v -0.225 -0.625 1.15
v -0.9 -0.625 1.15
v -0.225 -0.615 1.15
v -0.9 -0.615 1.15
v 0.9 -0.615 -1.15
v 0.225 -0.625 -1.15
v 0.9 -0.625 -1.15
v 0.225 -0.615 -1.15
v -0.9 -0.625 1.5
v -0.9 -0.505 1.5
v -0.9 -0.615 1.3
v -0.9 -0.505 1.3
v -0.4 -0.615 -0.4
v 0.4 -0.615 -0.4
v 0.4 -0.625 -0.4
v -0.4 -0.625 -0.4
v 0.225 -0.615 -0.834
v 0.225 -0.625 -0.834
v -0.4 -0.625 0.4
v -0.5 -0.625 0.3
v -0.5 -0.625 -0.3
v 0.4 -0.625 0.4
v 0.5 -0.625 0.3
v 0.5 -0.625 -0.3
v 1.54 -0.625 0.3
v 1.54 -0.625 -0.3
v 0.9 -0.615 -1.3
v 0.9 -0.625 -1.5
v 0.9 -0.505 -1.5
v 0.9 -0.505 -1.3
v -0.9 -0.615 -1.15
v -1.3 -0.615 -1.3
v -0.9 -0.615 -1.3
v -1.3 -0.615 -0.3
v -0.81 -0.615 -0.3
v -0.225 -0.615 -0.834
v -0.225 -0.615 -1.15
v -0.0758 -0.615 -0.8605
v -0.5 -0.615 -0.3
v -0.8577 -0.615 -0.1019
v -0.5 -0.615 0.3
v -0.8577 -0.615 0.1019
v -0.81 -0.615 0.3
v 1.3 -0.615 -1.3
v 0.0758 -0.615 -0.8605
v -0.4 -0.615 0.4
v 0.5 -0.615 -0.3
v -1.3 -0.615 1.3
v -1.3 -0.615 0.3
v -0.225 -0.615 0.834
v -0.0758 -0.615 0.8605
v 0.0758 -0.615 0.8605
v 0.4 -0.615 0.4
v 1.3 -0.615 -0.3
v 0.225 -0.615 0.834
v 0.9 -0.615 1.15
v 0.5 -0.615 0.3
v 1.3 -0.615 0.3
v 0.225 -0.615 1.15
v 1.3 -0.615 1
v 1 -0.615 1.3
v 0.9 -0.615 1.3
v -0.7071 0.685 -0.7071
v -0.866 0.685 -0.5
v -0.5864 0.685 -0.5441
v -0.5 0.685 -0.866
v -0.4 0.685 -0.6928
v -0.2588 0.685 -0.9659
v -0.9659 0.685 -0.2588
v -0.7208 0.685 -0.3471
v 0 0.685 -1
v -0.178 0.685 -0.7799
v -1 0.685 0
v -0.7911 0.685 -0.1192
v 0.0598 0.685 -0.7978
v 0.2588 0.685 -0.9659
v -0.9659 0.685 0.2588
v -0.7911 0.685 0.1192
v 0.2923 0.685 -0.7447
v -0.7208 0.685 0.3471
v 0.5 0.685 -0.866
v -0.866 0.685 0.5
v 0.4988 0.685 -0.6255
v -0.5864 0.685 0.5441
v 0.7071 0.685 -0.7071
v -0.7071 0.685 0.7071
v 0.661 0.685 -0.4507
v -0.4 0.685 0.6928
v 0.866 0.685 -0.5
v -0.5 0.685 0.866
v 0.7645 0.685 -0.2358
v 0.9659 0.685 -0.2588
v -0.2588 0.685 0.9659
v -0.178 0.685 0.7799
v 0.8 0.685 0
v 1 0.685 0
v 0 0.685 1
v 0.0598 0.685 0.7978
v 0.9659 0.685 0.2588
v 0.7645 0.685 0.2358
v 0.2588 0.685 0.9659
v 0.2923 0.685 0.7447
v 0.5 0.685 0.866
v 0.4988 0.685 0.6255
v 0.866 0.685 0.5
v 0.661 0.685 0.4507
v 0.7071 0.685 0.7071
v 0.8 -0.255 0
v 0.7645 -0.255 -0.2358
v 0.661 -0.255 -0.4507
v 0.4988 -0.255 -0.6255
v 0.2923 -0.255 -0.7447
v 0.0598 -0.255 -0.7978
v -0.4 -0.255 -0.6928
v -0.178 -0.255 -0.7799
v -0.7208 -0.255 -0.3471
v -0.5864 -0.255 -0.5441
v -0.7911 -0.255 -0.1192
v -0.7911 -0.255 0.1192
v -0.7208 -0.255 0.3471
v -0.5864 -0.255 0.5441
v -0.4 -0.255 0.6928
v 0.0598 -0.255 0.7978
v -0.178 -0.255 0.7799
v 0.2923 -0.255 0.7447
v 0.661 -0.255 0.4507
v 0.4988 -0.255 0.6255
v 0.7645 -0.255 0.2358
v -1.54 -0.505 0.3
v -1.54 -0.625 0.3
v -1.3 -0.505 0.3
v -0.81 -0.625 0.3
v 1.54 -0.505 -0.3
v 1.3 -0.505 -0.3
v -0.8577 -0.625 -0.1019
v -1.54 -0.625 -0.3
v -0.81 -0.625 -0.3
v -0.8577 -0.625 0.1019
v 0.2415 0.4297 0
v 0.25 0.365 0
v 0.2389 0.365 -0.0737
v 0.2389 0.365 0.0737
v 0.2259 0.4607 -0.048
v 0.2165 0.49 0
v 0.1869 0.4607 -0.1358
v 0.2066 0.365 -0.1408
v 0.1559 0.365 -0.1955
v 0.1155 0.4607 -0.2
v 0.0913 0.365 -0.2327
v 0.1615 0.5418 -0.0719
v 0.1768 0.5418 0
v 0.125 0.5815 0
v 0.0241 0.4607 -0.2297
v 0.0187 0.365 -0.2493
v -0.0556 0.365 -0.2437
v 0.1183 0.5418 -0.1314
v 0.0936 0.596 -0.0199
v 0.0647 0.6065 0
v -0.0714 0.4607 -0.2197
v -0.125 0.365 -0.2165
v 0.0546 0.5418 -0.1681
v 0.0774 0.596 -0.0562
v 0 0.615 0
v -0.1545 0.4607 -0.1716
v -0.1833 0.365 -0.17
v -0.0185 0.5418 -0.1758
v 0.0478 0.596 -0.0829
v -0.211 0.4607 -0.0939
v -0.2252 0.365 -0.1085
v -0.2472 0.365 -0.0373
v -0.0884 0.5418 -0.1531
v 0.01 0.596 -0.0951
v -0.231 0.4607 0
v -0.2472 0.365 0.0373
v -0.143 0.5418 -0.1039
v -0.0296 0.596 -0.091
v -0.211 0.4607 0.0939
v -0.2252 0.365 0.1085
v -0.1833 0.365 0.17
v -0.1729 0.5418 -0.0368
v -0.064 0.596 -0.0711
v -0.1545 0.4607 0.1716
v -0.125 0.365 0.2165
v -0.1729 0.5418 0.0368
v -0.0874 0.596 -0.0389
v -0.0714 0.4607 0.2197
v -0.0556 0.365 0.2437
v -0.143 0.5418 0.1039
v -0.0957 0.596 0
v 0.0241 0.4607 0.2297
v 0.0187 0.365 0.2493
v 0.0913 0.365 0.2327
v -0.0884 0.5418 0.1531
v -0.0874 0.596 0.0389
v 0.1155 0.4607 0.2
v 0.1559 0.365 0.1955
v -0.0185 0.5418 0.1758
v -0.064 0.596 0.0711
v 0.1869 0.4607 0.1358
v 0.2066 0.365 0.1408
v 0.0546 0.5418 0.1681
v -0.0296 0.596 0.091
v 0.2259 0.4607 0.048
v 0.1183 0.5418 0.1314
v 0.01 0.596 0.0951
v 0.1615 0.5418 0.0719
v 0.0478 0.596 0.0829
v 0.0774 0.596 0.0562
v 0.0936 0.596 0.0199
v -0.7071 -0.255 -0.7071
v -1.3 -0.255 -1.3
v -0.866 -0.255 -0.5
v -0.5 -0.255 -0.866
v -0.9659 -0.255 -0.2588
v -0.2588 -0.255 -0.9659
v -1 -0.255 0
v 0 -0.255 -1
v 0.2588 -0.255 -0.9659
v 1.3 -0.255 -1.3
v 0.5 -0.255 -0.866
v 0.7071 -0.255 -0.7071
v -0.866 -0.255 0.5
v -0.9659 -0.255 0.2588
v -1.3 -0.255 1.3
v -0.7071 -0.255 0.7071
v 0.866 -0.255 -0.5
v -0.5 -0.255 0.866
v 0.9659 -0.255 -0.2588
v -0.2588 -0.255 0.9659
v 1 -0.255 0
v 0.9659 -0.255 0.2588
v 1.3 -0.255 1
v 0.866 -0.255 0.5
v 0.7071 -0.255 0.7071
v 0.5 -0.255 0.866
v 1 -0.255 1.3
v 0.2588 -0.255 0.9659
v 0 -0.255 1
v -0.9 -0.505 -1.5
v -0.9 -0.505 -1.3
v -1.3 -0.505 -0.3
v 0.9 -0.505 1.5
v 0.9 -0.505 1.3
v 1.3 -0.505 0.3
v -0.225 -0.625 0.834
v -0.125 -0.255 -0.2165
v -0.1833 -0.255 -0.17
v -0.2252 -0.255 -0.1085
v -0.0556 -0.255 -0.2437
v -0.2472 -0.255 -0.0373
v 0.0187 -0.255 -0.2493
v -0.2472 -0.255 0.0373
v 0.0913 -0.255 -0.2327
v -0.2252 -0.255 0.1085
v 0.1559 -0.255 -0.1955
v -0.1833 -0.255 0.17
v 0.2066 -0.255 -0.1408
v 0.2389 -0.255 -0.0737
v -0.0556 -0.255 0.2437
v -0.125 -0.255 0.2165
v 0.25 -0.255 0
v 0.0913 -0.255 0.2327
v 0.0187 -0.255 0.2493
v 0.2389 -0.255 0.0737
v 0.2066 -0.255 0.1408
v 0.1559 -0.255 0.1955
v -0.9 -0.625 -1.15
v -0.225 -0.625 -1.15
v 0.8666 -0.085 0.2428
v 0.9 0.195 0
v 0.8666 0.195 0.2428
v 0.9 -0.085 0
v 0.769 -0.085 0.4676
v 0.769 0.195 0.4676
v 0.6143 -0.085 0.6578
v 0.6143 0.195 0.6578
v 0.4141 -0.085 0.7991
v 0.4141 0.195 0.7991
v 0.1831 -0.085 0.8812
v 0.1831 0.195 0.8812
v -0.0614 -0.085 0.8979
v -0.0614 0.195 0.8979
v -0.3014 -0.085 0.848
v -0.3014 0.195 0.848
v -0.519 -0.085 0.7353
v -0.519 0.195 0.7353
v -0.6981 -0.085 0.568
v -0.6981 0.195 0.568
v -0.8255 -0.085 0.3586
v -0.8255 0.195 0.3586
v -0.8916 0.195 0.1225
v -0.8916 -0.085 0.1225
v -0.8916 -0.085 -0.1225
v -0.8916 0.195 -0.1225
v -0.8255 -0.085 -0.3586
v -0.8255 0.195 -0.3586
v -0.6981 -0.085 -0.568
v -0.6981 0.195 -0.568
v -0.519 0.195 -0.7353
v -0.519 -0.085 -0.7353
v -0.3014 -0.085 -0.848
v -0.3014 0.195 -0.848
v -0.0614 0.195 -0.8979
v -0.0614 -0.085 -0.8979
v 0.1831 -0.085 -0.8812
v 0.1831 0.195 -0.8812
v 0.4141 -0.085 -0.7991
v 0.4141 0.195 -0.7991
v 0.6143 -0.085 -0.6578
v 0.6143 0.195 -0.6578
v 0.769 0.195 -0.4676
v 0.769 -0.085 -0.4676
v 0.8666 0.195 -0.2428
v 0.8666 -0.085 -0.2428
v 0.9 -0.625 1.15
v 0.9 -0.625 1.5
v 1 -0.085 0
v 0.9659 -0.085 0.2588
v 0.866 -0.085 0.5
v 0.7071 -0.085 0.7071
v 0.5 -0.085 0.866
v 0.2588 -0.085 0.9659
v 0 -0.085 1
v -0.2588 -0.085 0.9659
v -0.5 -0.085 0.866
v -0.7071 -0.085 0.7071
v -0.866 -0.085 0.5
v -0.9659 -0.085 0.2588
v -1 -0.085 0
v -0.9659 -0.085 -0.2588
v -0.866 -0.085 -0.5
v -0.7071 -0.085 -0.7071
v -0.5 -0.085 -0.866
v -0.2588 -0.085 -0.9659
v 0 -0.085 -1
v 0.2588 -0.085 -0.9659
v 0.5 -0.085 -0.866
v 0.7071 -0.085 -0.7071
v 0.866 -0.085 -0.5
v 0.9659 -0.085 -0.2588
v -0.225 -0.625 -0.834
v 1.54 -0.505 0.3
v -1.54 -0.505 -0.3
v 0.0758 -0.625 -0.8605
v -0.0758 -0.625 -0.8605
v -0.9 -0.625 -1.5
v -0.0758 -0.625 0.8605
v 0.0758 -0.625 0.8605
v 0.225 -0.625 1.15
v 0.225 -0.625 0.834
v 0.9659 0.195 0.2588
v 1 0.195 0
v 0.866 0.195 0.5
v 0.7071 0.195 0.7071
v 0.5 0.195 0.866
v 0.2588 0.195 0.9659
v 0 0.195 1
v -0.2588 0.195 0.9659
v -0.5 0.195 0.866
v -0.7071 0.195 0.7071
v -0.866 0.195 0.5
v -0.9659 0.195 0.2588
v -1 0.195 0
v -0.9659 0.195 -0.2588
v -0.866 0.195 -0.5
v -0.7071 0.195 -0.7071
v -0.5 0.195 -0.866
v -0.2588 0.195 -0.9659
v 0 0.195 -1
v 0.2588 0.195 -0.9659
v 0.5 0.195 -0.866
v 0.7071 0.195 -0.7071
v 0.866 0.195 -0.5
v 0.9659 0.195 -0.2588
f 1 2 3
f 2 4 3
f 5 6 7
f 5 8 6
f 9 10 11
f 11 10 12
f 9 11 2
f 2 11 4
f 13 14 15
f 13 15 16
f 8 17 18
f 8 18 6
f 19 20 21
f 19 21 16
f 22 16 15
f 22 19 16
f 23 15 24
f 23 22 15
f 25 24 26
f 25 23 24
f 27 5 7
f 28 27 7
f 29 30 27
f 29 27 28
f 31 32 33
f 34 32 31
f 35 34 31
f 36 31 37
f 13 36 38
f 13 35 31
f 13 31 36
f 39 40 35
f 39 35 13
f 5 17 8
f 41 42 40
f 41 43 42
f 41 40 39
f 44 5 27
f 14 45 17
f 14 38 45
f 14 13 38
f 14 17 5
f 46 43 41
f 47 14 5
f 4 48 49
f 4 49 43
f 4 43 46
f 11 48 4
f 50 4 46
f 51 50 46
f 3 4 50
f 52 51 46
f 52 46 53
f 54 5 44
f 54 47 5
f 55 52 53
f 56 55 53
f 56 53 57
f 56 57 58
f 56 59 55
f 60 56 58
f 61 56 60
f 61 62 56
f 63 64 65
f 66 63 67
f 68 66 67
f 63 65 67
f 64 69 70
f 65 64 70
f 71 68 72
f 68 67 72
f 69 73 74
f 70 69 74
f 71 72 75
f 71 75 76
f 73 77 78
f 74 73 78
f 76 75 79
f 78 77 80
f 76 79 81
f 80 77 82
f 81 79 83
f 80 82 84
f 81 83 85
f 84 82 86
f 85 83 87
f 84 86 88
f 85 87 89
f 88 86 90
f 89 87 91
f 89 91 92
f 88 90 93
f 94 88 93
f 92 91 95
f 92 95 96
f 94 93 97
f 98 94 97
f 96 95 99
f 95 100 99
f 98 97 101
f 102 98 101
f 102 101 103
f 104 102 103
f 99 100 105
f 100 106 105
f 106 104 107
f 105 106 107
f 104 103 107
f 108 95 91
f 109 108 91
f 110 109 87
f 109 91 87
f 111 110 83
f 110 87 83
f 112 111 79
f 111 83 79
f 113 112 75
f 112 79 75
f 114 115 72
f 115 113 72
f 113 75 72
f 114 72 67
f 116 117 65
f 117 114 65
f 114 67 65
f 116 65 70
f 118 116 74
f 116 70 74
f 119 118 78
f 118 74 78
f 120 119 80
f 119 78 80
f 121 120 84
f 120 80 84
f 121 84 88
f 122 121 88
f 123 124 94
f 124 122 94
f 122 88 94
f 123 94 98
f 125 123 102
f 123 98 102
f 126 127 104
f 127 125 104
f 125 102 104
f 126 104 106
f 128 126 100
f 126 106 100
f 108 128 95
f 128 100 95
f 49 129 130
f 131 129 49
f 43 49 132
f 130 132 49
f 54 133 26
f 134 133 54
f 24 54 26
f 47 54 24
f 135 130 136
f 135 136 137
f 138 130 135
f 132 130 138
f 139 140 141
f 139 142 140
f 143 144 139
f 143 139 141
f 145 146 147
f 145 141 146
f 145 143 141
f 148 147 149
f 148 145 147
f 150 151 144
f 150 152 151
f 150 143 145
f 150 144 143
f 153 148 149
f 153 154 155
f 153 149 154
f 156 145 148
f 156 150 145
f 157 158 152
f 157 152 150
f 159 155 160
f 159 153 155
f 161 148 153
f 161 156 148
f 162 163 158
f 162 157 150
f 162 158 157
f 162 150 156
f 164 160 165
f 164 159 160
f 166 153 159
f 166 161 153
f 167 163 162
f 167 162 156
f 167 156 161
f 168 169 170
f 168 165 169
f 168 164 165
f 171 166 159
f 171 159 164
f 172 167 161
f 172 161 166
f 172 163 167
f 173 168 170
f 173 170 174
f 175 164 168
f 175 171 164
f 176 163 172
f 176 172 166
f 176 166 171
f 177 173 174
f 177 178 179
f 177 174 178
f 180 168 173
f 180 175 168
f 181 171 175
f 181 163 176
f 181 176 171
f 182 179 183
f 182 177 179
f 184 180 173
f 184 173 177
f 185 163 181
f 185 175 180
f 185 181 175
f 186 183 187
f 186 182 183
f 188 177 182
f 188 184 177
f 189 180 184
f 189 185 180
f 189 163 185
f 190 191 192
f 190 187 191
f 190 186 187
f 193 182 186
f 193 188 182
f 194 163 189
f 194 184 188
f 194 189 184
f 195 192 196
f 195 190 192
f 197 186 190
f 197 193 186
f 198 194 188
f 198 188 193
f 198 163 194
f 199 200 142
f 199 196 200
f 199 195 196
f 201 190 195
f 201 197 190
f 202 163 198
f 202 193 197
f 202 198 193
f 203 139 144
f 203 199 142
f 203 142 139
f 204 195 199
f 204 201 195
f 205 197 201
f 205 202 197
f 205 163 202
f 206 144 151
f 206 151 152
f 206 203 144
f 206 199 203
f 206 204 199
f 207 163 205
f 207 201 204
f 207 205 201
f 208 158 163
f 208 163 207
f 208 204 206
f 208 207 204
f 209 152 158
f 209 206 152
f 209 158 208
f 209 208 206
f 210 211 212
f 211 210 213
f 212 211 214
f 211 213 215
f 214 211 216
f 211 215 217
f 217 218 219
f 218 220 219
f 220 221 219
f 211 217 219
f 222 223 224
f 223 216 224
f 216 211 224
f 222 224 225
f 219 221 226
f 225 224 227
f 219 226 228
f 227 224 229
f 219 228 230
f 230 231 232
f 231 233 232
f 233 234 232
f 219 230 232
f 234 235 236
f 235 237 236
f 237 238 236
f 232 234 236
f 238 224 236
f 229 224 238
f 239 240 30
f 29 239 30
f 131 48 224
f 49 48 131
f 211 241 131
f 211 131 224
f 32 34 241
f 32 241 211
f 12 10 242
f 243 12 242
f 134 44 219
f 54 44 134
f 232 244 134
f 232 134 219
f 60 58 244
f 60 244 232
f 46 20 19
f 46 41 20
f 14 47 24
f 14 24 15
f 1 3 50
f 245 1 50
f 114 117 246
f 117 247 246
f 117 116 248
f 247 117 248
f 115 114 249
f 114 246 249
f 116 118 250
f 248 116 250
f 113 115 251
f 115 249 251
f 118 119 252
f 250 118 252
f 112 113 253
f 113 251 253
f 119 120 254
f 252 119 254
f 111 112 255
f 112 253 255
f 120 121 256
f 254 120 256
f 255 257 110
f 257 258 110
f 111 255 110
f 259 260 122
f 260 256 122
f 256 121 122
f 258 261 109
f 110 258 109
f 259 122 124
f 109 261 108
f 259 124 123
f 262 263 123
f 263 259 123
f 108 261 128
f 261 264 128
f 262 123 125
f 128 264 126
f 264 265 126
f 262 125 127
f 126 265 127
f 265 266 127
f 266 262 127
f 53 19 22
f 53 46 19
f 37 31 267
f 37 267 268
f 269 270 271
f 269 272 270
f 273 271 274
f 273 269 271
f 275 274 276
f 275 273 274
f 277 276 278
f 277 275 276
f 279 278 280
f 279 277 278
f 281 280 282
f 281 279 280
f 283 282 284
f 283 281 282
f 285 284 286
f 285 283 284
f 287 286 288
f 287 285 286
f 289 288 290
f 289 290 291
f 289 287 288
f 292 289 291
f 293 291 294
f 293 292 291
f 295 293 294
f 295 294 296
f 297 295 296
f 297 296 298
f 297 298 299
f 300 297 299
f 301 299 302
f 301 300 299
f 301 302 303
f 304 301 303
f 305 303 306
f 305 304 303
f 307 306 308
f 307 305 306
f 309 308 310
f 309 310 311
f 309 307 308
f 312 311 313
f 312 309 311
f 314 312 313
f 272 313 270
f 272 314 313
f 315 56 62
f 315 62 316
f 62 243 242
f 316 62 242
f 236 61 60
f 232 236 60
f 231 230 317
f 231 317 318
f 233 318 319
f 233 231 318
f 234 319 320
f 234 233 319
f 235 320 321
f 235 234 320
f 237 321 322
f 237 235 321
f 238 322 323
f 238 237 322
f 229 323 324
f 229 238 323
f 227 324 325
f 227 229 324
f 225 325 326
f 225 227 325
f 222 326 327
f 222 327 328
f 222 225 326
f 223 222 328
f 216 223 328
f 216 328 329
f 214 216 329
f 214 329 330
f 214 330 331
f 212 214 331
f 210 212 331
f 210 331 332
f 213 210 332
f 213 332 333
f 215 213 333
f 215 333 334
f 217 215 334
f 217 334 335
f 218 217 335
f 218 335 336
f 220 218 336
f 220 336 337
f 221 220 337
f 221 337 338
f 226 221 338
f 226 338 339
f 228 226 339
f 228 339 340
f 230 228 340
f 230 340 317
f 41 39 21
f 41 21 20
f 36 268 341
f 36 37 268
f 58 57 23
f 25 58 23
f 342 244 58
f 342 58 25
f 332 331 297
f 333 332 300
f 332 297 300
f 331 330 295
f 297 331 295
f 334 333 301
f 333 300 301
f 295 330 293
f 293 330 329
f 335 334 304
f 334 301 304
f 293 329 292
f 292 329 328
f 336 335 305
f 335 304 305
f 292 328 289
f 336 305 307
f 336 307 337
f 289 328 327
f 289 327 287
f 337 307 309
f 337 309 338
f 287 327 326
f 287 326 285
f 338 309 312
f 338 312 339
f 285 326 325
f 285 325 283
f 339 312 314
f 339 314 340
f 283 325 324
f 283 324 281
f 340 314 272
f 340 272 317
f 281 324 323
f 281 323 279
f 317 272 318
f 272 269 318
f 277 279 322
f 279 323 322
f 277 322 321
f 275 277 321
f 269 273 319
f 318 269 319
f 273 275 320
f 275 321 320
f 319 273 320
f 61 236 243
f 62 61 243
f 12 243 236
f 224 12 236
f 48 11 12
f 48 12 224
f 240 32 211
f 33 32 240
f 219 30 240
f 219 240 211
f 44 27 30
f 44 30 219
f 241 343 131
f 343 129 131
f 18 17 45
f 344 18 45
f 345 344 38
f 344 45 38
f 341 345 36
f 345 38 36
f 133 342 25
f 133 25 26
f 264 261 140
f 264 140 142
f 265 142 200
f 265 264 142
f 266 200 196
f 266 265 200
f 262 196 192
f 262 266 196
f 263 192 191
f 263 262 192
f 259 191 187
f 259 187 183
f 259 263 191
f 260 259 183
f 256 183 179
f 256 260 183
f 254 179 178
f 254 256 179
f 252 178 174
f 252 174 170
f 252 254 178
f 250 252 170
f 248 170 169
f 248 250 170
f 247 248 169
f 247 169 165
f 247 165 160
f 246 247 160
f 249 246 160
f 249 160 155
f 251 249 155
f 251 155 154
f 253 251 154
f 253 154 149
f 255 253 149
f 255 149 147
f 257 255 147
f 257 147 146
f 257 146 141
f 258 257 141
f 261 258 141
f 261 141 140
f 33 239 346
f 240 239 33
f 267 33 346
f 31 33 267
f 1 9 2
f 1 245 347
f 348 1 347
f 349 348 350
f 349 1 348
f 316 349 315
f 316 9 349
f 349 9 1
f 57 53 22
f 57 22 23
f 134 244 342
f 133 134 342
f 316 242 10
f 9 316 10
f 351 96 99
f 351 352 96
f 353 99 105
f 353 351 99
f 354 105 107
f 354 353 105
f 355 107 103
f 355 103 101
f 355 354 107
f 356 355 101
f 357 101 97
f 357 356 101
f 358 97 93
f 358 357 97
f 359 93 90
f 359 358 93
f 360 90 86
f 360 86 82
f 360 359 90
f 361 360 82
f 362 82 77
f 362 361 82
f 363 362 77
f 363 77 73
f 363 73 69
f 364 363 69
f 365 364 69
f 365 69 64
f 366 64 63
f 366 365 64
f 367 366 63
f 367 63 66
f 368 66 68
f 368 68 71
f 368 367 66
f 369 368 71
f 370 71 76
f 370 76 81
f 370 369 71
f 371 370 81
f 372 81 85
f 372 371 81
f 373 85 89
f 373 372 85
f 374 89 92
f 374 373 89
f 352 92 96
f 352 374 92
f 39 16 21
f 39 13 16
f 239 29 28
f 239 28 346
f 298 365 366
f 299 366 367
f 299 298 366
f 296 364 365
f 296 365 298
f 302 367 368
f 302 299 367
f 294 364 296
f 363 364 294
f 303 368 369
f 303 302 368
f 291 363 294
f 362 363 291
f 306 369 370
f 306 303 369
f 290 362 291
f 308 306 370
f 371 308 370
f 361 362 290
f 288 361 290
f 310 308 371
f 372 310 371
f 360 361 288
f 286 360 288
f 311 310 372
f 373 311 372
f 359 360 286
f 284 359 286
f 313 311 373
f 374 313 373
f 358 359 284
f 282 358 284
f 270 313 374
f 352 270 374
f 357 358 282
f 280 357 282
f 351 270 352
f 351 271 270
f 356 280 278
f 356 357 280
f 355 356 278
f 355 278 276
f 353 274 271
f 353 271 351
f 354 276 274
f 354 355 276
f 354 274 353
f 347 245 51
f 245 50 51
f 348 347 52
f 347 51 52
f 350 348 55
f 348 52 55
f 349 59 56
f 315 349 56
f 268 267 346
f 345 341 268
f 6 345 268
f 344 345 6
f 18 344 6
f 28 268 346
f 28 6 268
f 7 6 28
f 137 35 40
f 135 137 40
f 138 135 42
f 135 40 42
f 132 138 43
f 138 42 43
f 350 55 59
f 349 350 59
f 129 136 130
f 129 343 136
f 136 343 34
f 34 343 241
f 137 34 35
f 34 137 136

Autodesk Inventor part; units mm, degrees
ref_plane "YZ Plane" through (0, 0, 0) normal (1, 0, 0) x (0, 1, 0)
ref_plane "XZ Plane" through (0, 0, 0) normal (0, 1, 0) x (-1, 0, 0)
ref_plane "XY Plane" through (0, 0, 0) normal (0, 0, 1) x (1, 0, 0)
sketch "Sketch1" plane through (0, 0, 0) normal (0, 0, 1) x (1, 0, 0)
  line L0 (0, 0.615) -> (0, -0.615)
  arc A0 (0.25, 0.365) -> (0, 0.615) centre (0, 0.365) ccw
  line L1 (0.25, 0.365) -> (0.25, -0.255)
  line L2 (0.25, -0.255) -> (0.8, -0.255)
  line L3 (0.8, -0.255) -> (0.8, 0.685)
  line L4 (0.8, 0.685) -> (1, 0.685)
  line L5 (1, 0.685) -> (1, 0.195)
  line L6 (1, 0.195) -> (0.9, 0.195)
  line L7 (0.9, 0.195) -> (0.9, -0.085)
  line L8 (0.9, -0.085) -> (1, -0.085)
  line L9 (1, -0.085) -> (1, -0.615)
  line L10 (1, -0.615) -> (0, -0.615)
  point P0 (0, 0)
  point P1 (0, 0)
  dimension "d0" = 1.23
  dimension "d1" = 0.5
  dimension "d2" = 1.6
  dimension "d3" = 2
  dimension "d4" = 1.3
  dimension "d5" = 0.49
  dimension "d6" = 0.28
  dimension "d7" = 0.1
  dimension "d8" = 0.36
revolve "Revolution1" add sketch "Sketch1" angle 360 about axis through (0, 0.615, 0) along (0, -1, 0)
sketch "Sketch2" plane through (0, -0.615, 0) normal (0, -1, 0) x (1, 0, 0)
  line L0 (-1.3, -1.3) -> (1.3, -1.3)
  line L1 (1.3, -1.3) -> (1.3, 1)
  line L2 (1, 1.3) -> (-1.3, 1.3)
  line L3 (-1.3, 1.3) -> (-1.3, -1.3)
  circle A0 centre (0, 0) radius 0.25 projected
  line L4 (-1.3, -1.3) -> (1.3, 1.3) construction
  line L5 (1.3, -1.3) -> (-1.3, 1.3) construction
  line L6 (1, 1.3) -> (1.3, 1)
  point P0 (0, 0)
  dimension "d10" = 2.6
  dimension "d11" = 0.3
  dimension "d12" = 0.3
extrude "Extrusion1" add sketch "Sketch2" against normal blind 0.36 contours L3 L2 L6 L1 L0 | A0
sketch "Sketch3" plane through (-1.3, -0.615, -1.3) normal (0, -1, 0) x (1, 0, 0)
  line L0 (0, 0) -> (2.6, 0) projected
  line L1 (2.6, 0) -> (2.6, 2.3) projected
  line L2 (2.6, 2.3) -> (2.3, 2.6) projected
  line L3 (2.3, 2.6) -> (0, 2.6) projected
  line L4 (0, 2.6) -> (0, 0) projected
  line L5 (2.84, 1.6) -> (2.84, 1)
  line L6 (2.84, 1) -> (1.8, 1)
  line L7 (1.8, 1) -> (1.7, 0.9)
  line L8 (1.7, 0.9) -> (0.9, 0.9)
  line L9 (0.9, 0.9) -> (0.8, 1)
  line L10 (0.8, 1) -> (0.8, 1.6)
  line L11 (0.8, 1.6) -> (0.9, 1.7)
  line L12 (0.9, 1.7) -> (1.7, 1.7)
  line L13 (1.7, 1.7) -> (1.8, 1.6)
  line L14 (1.8, 1.6) -> (2.84, 1.6)
  line L15 (-0.24, 1) -> (0.49, 1)
  line L16 (-0.24, 1) -> (-0.24, 1.6)
  line L17 (-0.24, 1.6) -> (0.49, 1.6)
  line L18 (1.525, 2.134) -> (1.525, 2.45)
  line L19 (1.525, 2.45) -> (2.2, 2.45)
  line L20 (2.2, 2.45) -> (2.2, 2.8)
  line L21 (2.2, 2.8) -> (0.4, 2.8)
  line L22 (0.4, 2.8) -> (0.4, 2.45)
  line L23 (0.4, 2.45) -> (1.075, 2.45)
  line L24 (1.075, 2.45) -> (1.075, 2.134)
  line L25 (1.525, 0.466) -> (1.525, 0.15)
  line L26 (1.525, 0.15) -> (2.2, 0.15)
  line L27 (2.2, 0.15) -> (2.2, -0.2)
  line L28 (2.2, -0.2) -> (0.4, -0.2)
  line L29 (0.4, -0.2) -> (0.4, 0.15)
  line L30 (0.4, 0.15) -> (1.075, 0.15)
  line L31 (1.075, 0.15) -> (1.075, 0.466)
  arc A0 (1.525, 2.134) -> (1.075, 2.134) centre (1.3, 1.3) ccw
  arc A1 (0.49, 1.6) -> (0.49, 1) centre (1.3, 1.3) ccw
  arc A2 (1.075, 0.466) -> (1.525, 0.466) centre (1.3, 1.3) ccw
  line L32 (1.3, 0) -> (1.3, 2.6) construction
  line L33 (0, 2.6) -> (2.3, 2.6) construction
  point P0 (1.3, 1.7)
  point P1 (1.3, 0.9)
  point P2 (1.3, -0.2)
  point P3 (1.3, 2.8)
  point P4 (0.8, 1.3)
  point P5 (2.84, 1.3)
  point P6 (-0.24, 1.3)
  dimension "d15" = 3
  dimension "d16" = 0.35
  dimension "d17" = 1.8
  dimension "d18" = 0.45
  dimension "d19" = 0.6
  dimension "d20" = 3.08
  dimension "d21" = 0.73
  dimension "d22" = 0.8
  dimension "d23" = 1
extrude "Extrusion2" add sketch "Sketch3" along normal blind 0.01 and the other way blind 0.11 contours L29 L30 L31 A2 L25 L26 L27 L0 | L0 L27 L28 L29 | L15 L16 L17 L4 | L4 L17 A1 L15 | L6 L7 L8 L9 L10 L11 L12 L13 L14 L1 | L1 L14 L5 L6 | L22 L21 L20 L3 | L3 L20 L19 L18 A0 L24 L23 L22
equation "\"d12\" = d11"
properties part number "U.FL_Male" material "ABS Plastic"
